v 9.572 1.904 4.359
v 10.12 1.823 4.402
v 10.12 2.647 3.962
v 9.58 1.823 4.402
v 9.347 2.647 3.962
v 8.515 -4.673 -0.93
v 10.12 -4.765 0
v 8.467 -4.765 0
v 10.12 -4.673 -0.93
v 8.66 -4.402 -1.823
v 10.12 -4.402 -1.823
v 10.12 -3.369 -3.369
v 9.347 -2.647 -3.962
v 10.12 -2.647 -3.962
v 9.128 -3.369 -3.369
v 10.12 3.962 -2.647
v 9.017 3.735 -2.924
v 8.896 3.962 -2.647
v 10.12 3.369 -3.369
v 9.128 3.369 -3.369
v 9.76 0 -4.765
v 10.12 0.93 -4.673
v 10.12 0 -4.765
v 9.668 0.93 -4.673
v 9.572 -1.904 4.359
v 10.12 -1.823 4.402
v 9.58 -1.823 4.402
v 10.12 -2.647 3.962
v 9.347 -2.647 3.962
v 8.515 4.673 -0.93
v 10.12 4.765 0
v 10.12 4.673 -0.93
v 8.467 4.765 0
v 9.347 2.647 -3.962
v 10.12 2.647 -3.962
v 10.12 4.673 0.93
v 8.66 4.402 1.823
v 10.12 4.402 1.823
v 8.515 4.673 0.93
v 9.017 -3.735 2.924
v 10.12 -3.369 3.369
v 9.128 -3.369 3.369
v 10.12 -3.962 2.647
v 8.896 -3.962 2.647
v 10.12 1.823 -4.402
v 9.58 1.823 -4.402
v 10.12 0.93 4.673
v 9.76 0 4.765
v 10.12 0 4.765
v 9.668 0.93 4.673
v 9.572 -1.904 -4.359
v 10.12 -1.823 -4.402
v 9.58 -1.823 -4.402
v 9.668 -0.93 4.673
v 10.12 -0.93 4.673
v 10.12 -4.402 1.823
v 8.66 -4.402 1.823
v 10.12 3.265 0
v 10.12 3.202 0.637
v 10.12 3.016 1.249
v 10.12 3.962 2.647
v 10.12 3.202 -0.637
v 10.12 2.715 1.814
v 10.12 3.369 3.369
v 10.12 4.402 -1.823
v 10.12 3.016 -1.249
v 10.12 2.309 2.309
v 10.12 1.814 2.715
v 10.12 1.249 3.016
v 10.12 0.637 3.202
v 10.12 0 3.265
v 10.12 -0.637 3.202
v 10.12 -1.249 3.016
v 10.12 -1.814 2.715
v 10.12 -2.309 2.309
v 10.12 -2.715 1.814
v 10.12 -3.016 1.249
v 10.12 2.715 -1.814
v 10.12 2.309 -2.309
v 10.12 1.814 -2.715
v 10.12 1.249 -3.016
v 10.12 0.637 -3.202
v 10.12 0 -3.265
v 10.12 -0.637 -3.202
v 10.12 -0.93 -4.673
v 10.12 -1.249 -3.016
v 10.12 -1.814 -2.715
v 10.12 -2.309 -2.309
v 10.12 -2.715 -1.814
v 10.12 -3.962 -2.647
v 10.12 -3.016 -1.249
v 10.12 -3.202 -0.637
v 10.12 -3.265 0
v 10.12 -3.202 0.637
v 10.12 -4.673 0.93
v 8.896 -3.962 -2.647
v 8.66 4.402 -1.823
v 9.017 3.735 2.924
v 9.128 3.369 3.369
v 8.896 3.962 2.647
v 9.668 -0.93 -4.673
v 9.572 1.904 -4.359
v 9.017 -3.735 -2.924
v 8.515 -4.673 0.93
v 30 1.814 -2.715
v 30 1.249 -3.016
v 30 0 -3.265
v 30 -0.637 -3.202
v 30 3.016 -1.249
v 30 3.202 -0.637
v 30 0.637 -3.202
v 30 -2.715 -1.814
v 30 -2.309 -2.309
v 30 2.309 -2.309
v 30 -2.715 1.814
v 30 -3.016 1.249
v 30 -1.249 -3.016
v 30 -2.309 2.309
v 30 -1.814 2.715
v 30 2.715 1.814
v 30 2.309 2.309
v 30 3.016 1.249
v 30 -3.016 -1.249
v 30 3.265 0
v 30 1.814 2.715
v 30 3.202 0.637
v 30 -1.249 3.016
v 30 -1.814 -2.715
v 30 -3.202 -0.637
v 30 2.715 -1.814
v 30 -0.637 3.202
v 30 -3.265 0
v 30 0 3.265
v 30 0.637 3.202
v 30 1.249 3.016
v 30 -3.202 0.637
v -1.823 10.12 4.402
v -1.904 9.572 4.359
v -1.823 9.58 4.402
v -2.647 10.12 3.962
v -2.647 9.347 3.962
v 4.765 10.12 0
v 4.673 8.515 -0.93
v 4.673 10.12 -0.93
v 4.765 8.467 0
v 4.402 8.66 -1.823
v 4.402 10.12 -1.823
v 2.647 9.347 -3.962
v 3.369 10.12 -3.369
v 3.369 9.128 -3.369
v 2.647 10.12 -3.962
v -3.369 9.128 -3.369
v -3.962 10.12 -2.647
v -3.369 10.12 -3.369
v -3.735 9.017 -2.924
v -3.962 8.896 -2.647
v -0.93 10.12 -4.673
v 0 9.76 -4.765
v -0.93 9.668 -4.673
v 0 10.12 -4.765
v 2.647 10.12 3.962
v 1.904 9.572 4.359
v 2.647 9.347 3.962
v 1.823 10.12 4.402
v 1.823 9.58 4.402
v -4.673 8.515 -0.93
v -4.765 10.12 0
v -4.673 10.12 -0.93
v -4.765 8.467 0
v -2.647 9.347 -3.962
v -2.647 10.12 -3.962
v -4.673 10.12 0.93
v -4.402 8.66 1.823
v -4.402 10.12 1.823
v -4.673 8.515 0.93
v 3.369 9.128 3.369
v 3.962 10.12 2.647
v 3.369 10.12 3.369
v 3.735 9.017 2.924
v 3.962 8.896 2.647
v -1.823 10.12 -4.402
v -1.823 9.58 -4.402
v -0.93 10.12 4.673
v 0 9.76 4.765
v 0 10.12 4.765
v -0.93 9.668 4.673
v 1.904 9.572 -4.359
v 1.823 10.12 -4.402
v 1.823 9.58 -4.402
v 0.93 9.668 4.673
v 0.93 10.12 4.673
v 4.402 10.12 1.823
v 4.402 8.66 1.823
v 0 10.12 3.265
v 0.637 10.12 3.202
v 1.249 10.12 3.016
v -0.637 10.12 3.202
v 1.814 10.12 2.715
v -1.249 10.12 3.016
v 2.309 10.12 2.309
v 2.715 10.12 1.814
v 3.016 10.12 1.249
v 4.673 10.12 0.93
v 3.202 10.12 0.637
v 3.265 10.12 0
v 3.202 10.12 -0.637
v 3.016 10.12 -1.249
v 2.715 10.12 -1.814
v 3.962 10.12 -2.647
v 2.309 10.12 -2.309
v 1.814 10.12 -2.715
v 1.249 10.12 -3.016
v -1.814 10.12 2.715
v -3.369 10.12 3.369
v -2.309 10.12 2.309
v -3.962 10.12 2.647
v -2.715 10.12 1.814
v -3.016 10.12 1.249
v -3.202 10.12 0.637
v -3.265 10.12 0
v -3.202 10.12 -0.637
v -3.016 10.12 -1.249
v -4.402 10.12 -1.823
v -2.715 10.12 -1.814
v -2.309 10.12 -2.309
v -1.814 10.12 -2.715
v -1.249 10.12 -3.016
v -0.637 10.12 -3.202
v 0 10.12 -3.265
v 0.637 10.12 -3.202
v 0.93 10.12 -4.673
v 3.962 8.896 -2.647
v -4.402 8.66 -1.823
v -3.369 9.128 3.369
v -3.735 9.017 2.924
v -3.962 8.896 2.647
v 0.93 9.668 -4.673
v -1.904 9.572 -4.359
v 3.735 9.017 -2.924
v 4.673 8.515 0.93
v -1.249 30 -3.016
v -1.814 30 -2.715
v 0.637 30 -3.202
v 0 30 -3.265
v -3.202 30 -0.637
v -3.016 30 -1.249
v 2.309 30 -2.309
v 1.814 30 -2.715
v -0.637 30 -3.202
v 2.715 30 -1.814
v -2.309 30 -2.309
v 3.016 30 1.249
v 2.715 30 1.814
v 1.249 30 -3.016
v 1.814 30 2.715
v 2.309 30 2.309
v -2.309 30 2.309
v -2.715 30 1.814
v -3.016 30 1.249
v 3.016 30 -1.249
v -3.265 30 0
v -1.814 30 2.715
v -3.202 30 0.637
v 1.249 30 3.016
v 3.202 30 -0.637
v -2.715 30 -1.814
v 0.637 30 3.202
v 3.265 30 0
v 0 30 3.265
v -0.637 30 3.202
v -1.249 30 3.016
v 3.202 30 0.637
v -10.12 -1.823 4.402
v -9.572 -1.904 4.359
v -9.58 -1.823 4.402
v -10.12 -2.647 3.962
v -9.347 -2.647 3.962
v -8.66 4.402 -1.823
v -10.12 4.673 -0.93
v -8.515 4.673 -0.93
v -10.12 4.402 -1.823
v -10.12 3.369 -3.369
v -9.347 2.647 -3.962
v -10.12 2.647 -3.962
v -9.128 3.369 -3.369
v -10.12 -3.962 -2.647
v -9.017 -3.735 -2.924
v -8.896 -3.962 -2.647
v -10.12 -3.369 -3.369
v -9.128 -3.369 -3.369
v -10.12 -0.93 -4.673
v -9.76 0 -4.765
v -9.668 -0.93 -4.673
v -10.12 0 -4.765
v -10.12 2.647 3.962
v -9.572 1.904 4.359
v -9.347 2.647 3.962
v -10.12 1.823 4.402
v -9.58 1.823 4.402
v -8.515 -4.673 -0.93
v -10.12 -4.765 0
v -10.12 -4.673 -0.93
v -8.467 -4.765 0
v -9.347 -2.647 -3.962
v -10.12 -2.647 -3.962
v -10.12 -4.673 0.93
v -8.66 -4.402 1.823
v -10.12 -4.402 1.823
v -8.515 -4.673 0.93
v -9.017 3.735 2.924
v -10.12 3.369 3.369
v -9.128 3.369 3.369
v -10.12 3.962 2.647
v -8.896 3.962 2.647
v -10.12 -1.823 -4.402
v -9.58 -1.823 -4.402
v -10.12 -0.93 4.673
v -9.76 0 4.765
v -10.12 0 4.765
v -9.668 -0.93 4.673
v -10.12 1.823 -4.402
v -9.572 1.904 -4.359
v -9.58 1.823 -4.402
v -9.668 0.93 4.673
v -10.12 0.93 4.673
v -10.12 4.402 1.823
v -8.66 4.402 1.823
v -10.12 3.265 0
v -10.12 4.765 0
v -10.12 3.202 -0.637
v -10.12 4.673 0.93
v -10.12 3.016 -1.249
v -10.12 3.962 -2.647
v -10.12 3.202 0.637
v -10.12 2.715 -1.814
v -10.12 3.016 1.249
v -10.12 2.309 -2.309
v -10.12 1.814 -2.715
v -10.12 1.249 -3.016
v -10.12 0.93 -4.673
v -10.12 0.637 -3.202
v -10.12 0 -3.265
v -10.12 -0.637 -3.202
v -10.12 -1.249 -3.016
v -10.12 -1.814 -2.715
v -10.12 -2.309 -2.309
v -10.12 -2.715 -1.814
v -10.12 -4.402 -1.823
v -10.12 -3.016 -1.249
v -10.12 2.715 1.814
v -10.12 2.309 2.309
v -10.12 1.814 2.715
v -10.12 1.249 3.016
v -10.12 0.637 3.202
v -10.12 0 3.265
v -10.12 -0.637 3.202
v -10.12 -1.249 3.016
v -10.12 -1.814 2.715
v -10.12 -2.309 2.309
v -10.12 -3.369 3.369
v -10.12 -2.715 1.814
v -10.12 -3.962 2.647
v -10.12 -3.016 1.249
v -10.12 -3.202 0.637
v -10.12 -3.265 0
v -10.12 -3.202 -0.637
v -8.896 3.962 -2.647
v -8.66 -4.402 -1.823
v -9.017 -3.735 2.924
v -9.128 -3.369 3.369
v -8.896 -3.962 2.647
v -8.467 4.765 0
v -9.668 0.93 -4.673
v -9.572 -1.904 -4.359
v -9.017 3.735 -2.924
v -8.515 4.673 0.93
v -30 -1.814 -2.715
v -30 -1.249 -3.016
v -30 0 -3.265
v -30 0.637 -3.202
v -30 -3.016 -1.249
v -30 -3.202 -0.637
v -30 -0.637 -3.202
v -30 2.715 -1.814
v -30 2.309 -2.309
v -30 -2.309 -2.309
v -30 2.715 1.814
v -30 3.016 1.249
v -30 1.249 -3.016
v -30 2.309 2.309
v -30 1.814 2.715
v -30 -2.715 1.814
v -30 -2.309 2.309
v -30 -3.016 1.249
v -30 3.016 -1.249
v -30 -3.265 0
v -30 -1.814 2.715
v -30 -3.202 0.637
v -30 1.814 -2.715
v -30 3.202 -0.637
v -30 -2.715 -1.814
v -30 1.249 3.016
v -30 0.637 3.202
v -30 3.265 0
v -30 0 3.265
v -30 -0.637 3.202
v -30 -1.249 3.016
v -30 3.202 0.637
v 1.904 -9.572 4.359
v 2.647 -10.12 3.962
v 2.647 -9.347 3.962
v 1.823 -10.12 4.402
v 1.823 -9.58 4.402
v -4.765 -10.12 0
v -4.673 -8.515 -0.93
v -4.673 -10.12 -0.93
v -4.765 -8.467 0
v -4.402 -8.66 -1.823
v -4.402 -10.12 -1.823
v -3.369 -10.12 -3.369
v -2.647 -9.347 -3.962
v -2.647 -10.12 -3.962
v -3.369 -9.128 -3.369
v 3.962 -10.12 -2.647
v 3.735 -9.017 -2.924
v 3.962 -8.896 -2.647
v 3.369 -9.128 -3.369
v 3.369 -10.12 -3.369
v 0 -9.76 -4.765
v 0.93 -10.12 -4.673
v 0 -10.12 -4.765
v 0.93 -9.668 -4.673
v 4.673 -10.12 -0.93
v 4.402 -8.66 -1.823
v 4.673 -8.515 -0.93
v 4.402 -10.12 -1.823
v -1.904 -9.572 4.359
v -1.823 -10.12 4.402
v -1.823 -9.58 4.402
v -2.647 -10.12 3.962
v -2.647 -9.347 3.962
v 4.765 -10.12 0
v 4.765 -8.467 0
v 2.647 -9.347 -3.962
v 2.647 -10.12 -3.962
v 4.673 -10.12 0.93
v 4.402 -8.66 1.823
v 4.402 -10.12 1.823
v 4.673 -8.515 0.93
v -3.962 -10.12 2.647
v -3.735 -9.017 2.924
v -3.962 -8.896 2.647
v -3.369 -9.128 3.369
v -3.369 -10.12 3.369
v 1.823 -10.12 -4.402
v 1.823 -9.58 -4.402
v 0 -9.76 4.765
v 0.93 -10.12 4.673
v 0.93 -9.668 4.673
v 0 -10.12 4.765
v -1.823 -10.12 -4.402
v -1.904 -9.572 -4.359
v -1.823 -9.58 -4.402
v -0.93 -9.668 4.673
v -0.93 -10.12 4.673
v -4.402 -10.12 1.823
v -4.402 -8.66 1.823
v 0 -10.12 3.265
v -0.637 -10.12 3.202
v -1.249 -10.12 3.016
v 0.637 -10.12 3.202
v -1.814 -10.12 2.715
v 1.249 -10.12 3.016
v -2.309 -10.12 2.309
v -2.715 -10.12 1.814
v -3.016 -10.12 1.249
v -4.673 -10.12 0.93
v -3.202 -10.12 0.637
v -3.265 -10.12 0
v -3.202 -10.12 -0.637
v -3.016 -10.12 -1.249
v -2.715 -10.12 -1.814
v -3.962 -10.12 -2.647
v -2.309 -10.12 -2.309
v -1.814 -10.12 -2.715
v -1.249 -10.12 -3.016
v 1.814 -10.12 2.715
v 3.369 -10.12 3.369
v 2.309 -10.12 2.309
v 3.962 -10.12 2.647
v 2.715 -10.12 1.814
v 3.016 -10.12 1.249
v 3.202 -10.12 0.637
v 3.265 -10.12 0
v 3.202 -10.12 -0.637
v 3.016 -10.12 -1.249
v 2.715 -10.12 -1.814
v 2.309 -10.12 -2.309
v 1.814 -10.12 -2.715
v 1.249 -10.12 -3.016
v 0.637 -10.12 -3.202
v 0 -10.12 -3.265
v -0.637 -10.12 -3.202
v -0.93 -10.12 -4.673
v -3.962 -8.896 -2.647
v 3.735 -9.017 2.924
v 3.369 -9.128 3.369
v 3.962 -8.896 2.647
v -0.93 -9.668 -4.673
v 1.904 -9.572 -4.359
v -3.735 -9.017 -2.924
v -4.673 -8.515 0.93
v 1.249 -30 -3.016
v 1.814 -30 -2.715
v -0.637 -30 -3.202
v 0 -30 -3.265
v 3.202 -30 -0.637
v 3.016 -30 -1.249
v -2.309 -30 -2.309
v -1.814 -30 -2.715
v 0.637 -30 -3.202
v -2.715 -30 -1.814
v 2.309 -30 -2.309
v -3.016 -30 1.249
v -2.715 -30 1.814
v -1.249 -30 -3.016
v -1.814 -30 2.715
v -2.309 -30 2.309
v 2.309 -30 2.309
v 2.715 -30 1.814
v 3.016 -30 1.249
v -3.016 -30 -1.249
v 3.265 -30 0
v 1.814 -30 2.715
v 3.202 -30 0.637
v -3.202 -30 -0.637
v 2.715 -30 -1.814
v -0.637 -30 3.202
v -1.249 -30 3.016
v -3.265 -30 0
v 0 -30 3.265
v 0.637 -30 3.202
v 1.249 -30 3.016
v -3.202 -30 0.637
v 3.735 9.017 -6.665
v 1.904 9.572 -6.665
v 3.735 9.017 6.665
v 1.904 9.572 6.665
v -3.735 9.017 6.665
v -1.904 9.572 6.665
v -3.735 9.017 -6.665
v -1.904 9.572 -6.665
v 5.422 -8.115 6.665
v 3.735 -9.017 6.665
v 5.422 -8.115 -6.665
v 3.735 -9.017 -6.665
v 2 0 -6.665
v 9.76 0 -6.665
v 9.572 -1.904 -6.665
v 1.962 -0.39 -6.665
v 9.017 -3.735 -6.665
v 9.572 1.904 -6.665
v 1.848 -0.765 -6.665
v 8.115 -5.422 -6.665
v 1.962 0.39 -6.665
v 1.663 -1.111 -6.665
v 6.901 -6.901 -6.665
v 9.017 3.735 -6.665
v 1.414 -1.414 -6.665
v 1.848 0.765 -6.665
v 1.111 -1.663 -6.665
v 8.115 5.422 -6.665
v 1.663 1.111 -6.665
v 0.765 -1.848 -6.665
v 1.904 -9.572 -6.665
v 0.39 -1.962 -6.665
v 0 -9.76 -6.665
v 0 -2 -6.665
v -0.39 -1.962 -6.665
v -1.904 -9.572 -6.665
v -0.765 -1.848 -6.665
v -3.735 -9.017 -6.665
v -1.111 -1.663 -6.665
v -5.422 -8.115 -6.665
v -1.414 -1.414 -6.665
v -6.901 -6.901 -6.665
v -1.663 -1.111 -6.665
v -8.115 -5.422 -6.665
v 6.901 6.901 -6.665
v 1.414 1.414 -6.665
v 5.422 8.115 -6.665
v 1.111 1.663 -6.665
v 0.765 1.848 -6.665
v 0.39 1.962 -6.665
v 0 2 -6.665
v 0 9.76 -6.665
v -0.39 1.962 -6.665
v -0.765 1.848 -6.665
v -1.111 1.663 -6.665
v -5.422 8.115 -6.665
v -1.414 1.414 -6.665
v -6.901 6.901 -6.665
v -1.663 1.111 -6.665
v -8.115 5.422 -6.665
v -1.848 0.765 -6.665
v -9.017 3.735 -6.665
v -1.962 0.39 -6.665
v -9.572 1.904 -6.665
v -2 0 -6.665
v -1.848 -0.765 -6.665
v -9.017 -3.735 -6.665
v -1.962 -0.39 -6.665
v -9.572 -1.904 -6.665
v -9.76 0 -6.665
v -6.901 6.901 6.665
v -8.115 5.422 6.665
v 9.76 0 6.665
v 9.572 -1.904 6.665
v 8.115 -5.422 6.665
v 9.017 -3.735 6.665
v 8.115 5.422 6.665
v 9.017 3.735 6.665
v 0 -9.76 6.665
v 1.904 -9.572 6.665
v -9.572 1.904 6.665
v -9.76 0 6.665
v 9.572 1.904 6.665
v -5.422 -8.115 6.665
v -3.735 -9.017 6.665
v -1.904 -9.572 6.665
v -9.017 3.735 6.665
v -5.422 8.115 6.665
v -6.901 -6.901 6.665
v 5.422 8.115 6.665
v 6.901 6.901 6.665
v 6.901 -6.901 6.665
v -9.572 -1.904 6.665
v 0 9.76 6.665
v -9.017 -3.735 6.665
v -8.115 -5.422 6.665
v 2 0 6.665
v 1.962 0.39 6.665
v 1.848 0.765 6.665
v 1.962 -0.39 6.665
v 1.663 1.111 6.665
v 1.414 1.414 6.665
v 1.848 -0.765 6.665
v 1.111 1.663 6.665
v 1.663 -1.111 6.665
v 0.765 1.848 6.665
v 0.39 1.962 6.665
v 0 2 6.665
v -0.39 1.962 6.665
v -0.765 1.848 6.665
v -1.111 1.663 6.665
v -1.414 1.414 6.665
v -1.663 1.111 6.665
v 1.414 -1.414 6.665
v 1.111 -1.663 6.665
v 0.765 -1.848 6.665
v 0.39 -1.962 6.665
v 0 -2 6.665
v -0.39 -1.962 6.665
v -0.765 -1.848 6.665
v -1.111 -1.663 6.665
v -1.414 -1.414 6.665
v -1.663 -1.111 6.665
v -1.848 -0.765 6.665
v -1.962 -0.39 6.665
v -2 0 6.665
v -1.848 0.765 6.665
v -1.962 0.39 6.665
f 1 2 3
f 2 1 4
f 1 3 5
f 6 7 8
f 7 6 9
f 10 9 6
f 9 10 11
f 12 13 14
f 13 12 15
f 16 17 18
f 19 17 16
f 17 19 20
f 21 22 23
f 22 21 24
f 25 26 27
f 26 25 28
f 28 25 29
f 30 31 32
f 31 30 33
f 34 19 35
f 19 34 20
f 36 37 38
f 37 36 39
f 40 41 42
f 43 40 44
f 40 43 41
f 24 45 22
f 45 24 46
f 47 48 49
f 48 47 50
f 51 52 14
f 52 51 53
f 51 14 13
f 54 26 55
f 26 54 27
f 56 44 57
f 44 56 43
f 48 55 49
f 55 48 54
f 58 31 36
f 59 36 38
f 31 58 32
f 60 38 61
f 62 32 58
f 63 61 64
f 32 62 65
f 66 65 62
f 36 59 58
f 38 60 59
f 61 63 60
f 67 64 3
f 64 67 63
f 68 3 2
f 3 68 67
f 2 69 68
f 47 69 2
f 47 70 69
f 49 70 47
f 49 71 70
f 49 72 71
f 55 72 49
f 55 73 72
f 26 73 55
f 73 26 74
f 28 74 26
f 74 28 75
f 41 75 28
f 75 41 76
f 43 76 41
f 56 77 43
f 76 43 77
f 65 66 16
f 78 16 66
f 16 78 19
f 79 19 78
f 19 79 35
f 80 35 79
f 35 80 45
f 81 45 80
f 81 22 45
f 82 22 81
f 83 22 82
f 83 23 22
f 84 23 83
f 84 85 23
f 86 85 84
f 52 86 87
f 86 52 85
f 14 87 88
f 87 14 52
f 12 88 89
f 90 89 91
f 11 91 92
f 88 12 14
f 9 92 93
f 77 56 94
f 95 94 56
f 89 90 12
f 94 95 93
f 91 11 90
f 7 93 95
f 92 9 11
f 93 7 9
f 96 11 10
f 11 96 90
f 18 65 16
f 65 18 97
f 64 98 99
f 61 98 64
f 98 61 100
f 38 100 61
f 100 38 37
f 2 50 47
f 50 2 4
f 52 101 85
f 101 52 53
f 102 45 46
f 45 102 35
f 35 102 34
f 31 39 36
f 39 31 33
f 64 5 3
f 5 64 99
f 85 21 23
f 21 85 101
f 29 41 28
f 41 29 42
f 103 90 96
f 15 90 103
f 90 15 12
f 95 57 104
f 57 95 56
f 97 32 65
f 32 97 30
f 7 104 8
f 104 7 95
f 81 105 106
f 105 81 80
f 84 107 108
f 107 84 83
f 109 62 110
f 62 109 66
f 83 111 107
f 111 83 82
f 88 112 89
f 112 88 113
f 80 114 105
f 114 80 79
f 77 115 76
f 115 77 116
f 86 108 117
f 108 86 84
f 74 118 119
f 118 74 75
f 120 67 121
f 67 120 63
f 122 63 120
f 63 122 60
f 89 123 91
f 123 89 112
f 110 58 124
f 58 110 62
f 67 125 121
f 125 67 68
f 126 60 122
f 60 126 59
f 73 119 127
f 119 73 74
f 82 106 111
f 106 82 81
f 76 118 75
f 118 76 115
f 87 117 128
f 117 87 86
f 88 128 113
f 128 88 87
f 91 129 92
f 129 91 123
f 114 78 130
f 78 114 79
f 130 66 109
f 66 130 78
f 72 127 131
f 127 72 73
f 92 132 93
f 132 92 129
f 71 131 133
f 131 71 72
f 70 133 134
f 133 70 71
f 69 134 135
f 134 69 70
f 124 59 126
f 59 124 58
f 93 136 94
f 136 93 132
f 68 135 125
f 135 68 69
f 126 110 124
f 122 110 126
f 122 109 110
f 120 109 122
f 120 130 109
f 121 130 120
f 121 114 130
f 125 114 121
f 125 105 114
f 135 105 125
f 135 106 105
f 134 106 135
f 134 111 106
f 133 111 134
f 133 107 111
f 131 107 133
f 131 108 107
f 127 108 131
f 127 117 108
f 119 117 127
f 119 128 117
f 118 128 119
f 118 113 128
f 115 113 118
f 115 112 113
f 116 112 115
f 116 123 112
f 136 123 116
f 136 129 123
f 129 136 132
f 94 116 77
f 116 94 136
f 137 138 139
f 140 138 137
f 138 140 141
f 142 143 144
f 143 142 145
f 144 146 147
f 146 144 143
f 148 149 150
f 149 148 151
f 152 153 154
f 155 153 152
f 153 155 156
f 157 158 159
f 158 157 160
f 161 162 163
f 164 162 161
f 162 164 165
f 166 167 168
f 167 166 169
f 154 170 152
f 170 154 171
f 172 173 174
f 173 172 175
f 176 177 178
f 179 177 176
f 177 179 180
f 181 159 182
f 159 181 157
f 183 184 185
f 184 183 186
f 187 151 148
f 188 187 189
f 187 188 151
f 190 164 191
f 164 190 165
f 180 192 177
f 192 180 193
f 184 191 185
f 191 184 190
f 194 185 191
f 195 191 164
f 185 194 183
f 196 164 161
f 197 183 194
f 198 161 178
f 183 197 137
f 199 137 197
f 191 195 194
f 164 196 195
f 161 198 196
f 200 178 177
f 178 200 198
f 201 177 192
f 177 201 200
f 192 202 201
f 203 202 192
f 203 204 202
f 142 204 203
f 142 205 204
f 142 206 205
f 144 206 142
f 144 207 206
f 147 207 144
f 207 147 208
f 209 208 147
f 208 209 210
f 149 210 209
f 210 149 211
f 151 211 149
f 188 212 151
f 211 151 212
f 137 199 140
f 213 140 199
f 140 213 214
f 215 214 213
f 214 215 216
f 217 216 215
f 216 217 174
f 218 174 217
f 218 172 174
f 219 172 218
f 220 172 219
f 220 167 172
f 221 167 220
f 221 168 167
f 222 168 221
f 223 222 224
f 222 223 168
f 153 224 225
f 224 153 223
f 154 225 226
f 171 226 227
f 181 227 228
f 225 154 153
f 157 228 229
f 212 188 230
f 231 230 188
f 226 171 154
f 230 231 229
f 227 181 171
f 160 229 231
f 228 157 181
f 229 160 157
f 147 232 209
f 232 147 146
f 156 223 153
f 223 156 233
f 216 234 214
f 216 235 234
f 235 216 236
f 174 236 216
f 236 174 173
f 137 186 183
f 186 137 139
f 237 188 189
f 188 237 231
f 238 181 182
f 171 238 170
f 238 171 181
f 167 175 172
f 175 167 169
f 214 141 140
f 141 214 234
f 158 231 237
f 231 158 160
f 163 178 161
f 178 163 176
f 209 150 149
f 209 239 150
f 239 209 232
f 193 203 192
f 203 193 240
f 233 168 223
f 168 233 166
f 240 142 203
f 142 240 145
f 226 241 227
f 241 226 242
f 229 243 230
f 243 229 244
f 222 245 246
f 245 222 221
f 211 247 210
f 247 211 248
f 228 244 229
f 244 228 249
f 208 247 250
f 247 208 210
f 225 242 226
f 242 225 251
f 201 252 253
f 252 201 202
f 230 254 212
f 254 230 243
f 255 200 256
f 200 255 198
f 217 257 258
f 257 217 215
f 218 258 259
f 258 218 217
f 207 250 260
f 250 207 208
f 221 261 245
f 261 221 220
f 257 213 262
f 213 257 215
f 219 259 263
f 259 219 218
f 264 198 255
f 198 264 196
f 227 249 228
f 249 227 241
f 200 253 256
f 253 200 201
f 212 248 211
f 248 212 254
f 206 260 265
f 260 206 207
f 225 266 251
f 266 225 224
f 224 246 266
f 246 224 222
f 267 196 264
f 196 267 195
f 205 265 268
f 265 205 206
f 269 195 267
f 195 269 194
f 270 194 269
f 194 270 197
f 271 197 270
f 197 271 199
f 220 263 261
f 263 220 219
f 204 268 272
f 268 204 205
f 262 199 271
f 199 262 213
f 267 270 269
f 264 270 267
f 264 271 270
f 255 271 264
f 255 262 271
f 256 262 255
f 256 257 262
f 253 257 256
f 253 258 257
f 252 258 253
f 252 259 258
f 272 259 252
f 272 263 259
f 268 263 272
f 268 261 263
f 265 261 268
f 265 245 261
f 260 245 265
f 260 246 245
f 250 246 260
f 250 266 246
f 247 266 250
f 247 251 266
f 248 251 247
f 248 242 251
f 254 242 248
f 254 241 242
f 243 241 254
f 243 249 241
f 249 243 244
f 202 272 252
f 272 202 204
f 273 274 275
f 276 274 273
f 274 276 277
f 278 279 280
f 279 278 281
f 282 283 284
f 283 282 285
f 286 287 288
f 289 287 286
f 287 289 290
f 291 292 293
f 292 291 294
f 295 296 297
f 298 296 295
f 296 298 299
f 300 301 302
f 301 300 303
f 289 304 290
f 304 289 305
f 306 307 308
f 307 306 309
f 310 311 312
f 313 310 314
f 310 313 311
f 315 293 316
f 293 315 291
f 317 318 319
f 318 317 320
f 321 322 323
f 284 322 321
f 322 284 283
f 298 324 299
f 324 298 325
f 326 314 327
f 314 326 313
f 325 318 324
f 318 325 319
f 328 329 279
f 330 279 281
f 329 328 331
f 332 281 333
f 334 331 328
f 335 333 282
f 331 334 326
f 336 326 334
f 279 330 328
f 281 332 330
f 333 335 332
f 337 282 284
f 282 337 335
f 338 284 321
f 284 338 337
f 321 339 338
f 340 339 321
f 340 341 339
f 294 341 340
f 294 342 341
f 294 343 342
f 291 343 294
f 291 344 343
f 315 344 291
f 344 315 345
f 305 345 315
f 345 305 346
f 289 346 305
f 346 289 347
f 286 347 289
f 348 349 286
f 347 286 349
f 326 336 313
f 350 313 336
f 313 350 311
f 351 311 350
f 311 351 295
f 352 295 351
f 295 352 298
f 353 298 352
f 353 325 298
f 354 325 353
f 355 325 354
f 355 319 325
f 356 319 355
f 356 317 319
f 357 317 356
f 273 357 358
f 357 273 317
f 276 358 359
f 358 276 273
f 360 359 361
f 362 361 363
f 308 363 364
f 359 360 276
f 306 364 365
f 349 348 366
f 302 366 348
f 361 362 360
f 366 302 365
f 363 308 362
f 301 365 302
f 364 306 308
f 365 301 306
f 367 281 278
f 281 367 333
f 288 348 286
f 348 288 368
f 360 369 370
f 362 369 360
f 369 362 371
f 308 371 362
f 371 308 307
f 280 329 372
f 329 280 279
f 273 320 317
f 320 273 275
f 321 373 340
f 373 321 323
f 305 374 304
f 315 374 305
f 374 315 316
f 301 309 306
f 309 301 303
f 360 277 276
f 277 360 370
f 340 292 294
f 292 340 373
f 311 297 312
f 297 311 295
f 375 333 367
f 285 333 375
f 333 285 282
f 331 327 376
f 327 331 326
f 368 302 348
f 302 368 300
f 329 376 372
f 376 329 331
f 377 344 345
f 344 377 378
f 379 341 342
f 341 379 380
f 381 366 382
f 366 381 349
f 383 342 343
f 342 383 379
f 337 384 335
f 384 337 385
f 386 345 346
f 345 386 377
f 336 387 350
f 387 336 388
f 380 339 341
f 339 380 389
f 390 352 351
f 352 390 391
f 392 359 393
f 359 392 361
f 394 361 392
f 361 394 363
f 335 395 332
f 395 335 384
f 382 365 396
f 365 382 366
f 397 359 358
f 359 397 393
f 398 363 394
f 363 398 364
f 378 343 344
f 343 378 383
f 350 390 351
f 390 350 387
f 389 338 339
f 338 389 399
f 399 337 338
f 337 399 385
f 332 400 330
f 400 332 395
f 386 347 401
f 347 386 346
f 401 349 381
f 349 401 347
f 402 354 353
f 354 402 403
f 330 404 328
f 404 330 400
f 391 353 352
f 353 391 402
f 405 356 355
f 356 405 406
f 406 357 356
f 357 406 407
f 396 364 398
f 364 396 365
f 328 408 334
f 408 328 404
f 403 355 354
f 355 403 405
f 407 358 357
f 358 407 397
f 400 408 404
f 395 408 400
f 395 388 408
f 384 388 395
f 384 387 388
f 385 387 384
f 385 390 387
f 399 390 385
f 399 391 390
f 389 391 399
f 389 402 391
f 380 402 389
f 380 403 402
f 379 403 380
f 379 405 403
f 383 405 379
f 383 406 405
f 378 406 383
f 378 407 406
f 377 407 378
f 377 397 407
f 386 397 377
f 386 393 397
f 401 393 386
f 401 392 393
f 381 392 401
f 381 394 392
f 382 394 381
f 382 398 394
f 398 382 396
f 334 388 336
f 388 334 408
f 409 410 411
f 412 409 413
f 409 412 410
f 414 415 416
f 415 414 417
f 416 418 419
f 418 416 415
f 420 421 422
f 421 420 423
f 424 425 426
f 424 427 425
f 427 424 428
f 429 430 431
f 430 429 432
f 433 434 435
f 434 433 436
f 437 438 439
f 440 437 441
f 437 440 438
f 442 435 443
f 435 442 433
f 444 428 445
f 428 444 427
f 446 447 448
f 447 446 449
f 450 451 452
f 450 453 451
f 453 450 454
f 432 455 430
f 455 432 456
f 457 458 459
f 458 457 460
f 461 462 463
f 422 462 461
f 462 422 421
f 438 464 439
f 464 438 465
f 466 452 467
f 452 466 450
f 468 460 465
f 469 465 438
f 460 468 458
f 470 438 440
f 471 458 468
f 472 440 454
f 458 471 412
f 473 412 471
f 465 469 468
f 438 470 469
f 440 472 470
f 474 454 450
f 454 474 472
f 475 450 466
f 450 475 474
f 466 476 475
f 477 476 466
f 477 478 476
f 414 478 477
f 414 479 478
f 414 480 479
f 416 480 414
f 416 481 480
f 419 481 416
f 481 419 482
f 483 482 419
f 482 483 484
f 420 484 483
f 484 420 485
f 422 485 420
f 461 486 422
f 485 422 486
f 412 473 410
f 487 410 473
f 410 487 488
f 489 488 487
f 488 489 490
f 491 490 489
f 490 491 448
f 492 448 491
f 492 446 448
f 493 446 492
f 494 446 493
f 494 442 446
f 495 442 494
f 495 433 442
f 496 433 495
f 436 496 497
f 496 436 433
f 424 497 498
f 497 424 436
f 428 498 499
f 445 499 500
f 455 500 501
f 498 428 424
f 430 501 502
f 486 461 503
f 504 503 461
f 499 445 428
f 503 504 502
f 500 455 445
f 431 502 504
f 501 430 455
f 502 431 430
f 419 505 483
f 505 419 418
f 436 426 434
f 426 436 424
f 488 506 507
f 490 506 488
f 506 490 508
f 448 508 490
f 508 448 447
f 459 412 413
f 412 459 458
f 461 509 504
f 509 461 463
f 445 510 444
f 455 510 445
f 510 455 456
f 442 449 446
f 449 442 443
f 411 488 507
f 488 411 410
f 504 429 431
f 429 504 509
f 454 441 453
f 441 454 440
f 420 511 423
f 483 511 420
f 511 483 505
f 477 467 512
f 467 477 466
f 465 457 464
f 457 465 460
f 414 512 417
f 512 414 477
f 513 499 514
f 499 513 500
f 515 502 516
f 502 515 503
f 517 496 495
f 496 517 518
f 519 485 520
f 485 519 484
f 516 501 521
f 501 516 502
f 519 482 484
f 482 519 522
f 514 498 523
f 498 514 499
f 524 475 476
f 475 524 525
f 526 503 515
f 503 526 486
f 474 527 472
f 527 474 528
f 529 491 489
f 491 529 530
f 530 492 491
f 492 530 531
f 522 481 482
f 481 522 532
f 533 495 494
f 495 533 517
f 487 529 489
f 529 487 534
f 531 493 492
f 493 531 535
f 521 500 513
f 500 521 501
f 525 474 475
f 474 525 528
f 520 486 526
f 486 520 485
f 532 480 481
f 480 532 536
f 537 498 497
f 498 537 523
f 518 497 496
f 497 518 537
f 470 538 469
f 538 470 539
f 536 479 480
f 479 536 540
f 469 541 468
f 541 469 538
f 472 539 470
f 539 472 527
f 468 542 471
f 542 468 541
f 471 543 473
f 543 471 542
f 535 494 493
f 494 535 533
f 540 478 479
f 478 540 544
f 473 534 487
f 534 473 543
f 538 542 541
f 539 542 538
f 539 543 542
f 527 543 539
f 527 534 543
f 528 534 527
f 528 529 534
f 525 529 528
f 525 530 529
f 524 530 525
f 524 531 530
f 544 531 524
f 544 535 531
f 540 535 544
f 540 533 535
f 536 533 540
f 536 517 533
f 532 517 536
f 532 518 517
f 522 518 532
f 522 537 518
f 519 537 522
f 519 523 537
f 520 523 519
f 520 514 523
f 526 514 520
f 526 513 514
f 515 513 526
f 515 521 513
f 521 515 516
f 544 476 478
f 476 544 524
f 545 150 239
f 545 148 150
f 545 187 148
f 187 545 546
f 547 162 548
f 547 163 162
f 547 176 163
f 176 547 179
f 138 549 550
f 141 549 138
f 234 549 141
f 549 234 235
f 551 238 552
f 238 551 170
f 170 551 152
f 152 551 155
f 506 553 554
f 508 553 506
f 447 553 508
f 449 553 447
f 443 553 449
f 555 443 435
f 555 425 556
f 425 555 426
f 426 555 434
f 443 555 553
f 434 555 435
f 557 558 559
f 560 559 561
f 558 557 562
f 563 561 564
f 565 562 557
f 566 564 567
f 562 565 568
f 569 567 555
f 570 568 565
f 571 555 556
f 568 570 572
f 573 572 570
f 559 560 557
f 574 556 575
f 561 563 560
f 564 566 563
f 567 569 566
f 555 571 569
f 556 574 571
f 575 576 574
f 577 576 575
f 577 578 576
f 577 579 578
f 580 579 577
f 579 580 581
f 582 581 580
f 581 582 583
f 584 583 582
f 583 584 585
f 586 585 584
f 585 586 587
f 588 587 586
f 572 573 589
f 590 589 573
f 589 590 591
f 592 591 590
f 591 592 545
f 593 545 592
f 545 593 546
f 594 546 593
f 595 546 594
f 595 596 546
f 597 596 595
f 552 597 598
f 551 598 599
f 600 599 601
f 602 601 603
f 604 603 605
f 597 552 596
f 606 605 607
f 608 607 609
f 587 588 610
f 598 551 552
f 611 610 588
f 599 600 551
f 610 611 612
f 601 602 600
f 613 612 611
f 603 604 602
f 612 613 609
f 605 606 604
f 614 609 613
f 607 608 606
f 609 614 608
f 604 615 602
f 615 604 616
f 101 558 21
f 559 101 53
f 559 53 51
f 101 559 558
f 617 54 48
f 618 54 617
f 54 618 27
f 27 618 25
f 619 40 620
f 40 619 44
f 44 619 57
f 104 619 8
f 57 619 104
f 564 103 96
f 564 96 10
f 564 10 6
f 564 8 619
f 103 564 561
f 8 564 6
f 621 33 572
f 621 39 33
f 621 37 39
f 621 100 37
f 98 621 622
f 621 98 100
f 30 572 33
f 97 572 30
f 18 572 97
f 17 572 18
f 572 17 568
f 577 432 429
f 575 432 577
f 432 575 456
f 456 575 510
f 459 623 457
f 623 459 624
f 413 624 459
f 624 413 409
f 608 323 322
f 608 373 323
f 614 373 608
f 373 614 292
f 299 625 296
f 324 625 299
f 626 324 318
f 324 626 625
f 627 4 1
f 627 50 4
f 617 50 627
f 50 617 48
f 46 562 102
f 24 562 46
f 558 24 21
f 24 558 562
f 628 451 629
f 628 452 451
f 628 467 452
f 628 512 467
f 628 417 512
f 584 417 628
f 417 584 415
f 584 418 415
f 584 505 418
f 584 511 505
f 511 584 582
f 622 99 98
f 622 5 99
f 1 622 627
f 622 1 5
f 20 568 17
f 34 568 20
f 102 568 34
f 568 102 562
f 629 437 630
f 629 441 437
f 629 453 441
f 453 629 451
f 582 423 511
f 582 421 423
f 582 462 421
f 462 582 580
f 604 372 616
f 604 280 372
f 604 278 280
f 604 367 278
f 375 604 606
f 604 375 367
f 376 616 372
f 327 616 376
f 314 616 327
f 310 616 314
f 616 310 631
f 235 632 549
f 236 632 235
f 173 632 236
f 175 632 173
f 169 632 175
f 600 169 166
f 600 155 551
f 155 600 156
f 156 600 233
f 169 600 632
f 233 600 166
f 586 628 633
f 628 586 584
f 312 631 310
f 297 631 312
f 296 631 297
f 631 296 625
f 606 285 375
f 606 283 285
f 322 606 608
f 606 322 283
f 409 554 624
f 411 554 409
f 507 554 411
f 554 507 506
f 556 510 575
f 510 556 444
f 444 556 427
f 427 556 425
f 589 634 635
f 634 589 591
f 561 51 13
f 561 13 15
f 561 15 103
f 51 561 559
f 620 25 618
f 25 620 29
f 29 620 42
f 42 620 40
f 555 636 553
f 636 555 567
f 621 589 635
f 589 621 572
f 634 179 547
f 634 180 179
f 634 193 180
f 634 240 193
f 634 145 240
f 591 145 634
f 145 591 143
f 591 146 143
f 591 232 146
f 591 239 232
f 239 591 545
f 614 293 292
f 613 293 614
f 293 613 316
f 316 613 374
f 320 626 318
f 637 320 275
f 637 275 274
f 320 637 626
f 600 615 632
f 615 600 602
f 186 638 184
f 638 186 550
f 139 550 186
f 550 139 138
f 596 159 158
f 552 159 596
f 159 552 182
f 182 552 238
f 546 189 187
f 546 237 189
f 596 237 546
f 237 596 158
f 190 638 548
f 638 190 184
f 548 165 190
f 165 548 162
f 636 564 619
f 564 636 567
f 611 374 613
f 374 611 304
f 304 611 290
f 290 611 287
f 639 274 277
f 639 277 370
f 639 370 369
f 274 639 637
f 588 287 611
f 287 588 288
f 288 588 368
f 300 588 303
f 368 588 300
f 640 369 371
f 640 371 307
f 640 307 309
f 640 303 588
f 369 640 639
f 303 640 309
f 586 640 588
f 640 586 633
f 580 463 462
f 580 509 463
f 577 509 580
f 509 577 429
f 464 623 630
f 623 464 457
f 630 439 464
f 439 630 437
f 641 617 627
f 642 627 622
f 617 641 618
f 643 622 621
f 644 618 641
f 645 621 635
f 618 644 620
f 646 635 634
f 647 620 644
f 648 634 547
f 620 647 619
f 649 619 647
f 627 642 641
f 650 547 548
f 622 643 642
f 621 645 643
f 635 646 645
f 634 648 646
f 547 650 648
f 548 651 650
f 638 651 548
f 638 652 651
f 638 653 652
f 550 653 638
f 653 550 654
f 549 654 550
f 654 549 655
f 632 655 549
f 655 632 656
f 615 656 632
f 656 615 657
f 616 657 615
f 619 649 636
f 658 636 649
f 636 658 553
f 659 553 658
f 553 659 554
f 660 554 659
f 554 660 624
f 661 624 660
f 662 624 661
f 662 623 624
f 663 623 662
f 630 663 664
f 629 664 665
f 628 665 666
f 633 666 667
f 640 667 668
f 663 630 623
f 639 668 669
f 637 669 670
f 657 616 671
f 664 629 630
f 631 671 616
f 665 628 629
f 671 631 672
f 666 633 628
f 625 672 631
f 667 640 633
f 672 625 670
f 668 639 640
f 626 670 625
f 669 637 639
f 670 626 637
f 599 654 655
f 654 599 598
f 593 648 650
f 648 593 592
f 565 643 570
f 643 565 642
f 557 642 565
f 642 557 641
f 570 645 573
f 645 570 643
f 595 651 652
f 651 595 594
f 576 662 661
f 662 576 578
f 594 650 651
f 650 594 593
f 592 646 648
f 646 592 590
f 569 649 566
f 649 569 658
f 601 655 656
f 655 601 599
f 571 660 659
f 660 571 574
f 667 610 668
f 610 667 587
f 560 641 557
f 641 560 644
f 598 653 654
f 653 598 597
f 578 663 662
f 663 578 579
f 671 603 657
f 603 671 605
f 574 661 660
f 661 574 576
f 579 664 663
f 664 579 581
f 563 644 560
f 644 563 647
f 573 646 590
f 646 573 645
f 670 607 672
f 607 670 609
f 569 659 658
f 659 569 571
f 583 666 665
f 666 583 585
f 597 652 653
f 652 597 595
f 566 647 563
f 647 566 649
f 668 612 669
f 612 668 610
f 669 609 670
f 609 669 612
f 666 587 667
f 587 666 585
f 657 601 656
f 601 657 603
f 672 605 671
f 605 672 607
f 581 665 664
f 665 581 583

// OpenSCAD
$fn = 32;

// ----------------------------------------------------------------------
// Cardan cross: 60 mm span, 9.53 mm trunnions
// ----------------------------------------------------------------------

// --- parameters (mm) ---
journal_d = 9.53;         // trunnion diameter
arm_len = 30;             // trunnion length from the centre
step_r = 3.24;            // step position from the centre
step_d = 6.53;            // journal diameter after the step
hub_d = 19.52;            // hub diameter
hub_h = 13.33;            // hub height
bore_d = 4;               // hub bore

difference() {
  union() {
    /* hub along the joint axis */
    cylinder(h = hub_h, d = hub_d, center = true);
    for (a = [0 : 90 : 270]) rotate([0, 0, a]) {
      /* trunnion, sunk into the hub */
      translate([hub_d / 4, 0, 0]) rotate([0, 90, 0]) cylinder(h = step_r + 2, d = journal_d);
      /* stepped journal out to the tip */
      translate([step_r - 0.5, 0, 0]) rotate([0, 90, 0]) cylinder(h = arm_len + 0.5 - step_r, d = step_d);
    }
  }
  /* lubrication bore through the hub, 2.5 mm clear on both sides */
  translate([0, 0, -hub_h / 2 - 2.5]) cylinder(h = hub_h + 5, d = bore_d);
}
